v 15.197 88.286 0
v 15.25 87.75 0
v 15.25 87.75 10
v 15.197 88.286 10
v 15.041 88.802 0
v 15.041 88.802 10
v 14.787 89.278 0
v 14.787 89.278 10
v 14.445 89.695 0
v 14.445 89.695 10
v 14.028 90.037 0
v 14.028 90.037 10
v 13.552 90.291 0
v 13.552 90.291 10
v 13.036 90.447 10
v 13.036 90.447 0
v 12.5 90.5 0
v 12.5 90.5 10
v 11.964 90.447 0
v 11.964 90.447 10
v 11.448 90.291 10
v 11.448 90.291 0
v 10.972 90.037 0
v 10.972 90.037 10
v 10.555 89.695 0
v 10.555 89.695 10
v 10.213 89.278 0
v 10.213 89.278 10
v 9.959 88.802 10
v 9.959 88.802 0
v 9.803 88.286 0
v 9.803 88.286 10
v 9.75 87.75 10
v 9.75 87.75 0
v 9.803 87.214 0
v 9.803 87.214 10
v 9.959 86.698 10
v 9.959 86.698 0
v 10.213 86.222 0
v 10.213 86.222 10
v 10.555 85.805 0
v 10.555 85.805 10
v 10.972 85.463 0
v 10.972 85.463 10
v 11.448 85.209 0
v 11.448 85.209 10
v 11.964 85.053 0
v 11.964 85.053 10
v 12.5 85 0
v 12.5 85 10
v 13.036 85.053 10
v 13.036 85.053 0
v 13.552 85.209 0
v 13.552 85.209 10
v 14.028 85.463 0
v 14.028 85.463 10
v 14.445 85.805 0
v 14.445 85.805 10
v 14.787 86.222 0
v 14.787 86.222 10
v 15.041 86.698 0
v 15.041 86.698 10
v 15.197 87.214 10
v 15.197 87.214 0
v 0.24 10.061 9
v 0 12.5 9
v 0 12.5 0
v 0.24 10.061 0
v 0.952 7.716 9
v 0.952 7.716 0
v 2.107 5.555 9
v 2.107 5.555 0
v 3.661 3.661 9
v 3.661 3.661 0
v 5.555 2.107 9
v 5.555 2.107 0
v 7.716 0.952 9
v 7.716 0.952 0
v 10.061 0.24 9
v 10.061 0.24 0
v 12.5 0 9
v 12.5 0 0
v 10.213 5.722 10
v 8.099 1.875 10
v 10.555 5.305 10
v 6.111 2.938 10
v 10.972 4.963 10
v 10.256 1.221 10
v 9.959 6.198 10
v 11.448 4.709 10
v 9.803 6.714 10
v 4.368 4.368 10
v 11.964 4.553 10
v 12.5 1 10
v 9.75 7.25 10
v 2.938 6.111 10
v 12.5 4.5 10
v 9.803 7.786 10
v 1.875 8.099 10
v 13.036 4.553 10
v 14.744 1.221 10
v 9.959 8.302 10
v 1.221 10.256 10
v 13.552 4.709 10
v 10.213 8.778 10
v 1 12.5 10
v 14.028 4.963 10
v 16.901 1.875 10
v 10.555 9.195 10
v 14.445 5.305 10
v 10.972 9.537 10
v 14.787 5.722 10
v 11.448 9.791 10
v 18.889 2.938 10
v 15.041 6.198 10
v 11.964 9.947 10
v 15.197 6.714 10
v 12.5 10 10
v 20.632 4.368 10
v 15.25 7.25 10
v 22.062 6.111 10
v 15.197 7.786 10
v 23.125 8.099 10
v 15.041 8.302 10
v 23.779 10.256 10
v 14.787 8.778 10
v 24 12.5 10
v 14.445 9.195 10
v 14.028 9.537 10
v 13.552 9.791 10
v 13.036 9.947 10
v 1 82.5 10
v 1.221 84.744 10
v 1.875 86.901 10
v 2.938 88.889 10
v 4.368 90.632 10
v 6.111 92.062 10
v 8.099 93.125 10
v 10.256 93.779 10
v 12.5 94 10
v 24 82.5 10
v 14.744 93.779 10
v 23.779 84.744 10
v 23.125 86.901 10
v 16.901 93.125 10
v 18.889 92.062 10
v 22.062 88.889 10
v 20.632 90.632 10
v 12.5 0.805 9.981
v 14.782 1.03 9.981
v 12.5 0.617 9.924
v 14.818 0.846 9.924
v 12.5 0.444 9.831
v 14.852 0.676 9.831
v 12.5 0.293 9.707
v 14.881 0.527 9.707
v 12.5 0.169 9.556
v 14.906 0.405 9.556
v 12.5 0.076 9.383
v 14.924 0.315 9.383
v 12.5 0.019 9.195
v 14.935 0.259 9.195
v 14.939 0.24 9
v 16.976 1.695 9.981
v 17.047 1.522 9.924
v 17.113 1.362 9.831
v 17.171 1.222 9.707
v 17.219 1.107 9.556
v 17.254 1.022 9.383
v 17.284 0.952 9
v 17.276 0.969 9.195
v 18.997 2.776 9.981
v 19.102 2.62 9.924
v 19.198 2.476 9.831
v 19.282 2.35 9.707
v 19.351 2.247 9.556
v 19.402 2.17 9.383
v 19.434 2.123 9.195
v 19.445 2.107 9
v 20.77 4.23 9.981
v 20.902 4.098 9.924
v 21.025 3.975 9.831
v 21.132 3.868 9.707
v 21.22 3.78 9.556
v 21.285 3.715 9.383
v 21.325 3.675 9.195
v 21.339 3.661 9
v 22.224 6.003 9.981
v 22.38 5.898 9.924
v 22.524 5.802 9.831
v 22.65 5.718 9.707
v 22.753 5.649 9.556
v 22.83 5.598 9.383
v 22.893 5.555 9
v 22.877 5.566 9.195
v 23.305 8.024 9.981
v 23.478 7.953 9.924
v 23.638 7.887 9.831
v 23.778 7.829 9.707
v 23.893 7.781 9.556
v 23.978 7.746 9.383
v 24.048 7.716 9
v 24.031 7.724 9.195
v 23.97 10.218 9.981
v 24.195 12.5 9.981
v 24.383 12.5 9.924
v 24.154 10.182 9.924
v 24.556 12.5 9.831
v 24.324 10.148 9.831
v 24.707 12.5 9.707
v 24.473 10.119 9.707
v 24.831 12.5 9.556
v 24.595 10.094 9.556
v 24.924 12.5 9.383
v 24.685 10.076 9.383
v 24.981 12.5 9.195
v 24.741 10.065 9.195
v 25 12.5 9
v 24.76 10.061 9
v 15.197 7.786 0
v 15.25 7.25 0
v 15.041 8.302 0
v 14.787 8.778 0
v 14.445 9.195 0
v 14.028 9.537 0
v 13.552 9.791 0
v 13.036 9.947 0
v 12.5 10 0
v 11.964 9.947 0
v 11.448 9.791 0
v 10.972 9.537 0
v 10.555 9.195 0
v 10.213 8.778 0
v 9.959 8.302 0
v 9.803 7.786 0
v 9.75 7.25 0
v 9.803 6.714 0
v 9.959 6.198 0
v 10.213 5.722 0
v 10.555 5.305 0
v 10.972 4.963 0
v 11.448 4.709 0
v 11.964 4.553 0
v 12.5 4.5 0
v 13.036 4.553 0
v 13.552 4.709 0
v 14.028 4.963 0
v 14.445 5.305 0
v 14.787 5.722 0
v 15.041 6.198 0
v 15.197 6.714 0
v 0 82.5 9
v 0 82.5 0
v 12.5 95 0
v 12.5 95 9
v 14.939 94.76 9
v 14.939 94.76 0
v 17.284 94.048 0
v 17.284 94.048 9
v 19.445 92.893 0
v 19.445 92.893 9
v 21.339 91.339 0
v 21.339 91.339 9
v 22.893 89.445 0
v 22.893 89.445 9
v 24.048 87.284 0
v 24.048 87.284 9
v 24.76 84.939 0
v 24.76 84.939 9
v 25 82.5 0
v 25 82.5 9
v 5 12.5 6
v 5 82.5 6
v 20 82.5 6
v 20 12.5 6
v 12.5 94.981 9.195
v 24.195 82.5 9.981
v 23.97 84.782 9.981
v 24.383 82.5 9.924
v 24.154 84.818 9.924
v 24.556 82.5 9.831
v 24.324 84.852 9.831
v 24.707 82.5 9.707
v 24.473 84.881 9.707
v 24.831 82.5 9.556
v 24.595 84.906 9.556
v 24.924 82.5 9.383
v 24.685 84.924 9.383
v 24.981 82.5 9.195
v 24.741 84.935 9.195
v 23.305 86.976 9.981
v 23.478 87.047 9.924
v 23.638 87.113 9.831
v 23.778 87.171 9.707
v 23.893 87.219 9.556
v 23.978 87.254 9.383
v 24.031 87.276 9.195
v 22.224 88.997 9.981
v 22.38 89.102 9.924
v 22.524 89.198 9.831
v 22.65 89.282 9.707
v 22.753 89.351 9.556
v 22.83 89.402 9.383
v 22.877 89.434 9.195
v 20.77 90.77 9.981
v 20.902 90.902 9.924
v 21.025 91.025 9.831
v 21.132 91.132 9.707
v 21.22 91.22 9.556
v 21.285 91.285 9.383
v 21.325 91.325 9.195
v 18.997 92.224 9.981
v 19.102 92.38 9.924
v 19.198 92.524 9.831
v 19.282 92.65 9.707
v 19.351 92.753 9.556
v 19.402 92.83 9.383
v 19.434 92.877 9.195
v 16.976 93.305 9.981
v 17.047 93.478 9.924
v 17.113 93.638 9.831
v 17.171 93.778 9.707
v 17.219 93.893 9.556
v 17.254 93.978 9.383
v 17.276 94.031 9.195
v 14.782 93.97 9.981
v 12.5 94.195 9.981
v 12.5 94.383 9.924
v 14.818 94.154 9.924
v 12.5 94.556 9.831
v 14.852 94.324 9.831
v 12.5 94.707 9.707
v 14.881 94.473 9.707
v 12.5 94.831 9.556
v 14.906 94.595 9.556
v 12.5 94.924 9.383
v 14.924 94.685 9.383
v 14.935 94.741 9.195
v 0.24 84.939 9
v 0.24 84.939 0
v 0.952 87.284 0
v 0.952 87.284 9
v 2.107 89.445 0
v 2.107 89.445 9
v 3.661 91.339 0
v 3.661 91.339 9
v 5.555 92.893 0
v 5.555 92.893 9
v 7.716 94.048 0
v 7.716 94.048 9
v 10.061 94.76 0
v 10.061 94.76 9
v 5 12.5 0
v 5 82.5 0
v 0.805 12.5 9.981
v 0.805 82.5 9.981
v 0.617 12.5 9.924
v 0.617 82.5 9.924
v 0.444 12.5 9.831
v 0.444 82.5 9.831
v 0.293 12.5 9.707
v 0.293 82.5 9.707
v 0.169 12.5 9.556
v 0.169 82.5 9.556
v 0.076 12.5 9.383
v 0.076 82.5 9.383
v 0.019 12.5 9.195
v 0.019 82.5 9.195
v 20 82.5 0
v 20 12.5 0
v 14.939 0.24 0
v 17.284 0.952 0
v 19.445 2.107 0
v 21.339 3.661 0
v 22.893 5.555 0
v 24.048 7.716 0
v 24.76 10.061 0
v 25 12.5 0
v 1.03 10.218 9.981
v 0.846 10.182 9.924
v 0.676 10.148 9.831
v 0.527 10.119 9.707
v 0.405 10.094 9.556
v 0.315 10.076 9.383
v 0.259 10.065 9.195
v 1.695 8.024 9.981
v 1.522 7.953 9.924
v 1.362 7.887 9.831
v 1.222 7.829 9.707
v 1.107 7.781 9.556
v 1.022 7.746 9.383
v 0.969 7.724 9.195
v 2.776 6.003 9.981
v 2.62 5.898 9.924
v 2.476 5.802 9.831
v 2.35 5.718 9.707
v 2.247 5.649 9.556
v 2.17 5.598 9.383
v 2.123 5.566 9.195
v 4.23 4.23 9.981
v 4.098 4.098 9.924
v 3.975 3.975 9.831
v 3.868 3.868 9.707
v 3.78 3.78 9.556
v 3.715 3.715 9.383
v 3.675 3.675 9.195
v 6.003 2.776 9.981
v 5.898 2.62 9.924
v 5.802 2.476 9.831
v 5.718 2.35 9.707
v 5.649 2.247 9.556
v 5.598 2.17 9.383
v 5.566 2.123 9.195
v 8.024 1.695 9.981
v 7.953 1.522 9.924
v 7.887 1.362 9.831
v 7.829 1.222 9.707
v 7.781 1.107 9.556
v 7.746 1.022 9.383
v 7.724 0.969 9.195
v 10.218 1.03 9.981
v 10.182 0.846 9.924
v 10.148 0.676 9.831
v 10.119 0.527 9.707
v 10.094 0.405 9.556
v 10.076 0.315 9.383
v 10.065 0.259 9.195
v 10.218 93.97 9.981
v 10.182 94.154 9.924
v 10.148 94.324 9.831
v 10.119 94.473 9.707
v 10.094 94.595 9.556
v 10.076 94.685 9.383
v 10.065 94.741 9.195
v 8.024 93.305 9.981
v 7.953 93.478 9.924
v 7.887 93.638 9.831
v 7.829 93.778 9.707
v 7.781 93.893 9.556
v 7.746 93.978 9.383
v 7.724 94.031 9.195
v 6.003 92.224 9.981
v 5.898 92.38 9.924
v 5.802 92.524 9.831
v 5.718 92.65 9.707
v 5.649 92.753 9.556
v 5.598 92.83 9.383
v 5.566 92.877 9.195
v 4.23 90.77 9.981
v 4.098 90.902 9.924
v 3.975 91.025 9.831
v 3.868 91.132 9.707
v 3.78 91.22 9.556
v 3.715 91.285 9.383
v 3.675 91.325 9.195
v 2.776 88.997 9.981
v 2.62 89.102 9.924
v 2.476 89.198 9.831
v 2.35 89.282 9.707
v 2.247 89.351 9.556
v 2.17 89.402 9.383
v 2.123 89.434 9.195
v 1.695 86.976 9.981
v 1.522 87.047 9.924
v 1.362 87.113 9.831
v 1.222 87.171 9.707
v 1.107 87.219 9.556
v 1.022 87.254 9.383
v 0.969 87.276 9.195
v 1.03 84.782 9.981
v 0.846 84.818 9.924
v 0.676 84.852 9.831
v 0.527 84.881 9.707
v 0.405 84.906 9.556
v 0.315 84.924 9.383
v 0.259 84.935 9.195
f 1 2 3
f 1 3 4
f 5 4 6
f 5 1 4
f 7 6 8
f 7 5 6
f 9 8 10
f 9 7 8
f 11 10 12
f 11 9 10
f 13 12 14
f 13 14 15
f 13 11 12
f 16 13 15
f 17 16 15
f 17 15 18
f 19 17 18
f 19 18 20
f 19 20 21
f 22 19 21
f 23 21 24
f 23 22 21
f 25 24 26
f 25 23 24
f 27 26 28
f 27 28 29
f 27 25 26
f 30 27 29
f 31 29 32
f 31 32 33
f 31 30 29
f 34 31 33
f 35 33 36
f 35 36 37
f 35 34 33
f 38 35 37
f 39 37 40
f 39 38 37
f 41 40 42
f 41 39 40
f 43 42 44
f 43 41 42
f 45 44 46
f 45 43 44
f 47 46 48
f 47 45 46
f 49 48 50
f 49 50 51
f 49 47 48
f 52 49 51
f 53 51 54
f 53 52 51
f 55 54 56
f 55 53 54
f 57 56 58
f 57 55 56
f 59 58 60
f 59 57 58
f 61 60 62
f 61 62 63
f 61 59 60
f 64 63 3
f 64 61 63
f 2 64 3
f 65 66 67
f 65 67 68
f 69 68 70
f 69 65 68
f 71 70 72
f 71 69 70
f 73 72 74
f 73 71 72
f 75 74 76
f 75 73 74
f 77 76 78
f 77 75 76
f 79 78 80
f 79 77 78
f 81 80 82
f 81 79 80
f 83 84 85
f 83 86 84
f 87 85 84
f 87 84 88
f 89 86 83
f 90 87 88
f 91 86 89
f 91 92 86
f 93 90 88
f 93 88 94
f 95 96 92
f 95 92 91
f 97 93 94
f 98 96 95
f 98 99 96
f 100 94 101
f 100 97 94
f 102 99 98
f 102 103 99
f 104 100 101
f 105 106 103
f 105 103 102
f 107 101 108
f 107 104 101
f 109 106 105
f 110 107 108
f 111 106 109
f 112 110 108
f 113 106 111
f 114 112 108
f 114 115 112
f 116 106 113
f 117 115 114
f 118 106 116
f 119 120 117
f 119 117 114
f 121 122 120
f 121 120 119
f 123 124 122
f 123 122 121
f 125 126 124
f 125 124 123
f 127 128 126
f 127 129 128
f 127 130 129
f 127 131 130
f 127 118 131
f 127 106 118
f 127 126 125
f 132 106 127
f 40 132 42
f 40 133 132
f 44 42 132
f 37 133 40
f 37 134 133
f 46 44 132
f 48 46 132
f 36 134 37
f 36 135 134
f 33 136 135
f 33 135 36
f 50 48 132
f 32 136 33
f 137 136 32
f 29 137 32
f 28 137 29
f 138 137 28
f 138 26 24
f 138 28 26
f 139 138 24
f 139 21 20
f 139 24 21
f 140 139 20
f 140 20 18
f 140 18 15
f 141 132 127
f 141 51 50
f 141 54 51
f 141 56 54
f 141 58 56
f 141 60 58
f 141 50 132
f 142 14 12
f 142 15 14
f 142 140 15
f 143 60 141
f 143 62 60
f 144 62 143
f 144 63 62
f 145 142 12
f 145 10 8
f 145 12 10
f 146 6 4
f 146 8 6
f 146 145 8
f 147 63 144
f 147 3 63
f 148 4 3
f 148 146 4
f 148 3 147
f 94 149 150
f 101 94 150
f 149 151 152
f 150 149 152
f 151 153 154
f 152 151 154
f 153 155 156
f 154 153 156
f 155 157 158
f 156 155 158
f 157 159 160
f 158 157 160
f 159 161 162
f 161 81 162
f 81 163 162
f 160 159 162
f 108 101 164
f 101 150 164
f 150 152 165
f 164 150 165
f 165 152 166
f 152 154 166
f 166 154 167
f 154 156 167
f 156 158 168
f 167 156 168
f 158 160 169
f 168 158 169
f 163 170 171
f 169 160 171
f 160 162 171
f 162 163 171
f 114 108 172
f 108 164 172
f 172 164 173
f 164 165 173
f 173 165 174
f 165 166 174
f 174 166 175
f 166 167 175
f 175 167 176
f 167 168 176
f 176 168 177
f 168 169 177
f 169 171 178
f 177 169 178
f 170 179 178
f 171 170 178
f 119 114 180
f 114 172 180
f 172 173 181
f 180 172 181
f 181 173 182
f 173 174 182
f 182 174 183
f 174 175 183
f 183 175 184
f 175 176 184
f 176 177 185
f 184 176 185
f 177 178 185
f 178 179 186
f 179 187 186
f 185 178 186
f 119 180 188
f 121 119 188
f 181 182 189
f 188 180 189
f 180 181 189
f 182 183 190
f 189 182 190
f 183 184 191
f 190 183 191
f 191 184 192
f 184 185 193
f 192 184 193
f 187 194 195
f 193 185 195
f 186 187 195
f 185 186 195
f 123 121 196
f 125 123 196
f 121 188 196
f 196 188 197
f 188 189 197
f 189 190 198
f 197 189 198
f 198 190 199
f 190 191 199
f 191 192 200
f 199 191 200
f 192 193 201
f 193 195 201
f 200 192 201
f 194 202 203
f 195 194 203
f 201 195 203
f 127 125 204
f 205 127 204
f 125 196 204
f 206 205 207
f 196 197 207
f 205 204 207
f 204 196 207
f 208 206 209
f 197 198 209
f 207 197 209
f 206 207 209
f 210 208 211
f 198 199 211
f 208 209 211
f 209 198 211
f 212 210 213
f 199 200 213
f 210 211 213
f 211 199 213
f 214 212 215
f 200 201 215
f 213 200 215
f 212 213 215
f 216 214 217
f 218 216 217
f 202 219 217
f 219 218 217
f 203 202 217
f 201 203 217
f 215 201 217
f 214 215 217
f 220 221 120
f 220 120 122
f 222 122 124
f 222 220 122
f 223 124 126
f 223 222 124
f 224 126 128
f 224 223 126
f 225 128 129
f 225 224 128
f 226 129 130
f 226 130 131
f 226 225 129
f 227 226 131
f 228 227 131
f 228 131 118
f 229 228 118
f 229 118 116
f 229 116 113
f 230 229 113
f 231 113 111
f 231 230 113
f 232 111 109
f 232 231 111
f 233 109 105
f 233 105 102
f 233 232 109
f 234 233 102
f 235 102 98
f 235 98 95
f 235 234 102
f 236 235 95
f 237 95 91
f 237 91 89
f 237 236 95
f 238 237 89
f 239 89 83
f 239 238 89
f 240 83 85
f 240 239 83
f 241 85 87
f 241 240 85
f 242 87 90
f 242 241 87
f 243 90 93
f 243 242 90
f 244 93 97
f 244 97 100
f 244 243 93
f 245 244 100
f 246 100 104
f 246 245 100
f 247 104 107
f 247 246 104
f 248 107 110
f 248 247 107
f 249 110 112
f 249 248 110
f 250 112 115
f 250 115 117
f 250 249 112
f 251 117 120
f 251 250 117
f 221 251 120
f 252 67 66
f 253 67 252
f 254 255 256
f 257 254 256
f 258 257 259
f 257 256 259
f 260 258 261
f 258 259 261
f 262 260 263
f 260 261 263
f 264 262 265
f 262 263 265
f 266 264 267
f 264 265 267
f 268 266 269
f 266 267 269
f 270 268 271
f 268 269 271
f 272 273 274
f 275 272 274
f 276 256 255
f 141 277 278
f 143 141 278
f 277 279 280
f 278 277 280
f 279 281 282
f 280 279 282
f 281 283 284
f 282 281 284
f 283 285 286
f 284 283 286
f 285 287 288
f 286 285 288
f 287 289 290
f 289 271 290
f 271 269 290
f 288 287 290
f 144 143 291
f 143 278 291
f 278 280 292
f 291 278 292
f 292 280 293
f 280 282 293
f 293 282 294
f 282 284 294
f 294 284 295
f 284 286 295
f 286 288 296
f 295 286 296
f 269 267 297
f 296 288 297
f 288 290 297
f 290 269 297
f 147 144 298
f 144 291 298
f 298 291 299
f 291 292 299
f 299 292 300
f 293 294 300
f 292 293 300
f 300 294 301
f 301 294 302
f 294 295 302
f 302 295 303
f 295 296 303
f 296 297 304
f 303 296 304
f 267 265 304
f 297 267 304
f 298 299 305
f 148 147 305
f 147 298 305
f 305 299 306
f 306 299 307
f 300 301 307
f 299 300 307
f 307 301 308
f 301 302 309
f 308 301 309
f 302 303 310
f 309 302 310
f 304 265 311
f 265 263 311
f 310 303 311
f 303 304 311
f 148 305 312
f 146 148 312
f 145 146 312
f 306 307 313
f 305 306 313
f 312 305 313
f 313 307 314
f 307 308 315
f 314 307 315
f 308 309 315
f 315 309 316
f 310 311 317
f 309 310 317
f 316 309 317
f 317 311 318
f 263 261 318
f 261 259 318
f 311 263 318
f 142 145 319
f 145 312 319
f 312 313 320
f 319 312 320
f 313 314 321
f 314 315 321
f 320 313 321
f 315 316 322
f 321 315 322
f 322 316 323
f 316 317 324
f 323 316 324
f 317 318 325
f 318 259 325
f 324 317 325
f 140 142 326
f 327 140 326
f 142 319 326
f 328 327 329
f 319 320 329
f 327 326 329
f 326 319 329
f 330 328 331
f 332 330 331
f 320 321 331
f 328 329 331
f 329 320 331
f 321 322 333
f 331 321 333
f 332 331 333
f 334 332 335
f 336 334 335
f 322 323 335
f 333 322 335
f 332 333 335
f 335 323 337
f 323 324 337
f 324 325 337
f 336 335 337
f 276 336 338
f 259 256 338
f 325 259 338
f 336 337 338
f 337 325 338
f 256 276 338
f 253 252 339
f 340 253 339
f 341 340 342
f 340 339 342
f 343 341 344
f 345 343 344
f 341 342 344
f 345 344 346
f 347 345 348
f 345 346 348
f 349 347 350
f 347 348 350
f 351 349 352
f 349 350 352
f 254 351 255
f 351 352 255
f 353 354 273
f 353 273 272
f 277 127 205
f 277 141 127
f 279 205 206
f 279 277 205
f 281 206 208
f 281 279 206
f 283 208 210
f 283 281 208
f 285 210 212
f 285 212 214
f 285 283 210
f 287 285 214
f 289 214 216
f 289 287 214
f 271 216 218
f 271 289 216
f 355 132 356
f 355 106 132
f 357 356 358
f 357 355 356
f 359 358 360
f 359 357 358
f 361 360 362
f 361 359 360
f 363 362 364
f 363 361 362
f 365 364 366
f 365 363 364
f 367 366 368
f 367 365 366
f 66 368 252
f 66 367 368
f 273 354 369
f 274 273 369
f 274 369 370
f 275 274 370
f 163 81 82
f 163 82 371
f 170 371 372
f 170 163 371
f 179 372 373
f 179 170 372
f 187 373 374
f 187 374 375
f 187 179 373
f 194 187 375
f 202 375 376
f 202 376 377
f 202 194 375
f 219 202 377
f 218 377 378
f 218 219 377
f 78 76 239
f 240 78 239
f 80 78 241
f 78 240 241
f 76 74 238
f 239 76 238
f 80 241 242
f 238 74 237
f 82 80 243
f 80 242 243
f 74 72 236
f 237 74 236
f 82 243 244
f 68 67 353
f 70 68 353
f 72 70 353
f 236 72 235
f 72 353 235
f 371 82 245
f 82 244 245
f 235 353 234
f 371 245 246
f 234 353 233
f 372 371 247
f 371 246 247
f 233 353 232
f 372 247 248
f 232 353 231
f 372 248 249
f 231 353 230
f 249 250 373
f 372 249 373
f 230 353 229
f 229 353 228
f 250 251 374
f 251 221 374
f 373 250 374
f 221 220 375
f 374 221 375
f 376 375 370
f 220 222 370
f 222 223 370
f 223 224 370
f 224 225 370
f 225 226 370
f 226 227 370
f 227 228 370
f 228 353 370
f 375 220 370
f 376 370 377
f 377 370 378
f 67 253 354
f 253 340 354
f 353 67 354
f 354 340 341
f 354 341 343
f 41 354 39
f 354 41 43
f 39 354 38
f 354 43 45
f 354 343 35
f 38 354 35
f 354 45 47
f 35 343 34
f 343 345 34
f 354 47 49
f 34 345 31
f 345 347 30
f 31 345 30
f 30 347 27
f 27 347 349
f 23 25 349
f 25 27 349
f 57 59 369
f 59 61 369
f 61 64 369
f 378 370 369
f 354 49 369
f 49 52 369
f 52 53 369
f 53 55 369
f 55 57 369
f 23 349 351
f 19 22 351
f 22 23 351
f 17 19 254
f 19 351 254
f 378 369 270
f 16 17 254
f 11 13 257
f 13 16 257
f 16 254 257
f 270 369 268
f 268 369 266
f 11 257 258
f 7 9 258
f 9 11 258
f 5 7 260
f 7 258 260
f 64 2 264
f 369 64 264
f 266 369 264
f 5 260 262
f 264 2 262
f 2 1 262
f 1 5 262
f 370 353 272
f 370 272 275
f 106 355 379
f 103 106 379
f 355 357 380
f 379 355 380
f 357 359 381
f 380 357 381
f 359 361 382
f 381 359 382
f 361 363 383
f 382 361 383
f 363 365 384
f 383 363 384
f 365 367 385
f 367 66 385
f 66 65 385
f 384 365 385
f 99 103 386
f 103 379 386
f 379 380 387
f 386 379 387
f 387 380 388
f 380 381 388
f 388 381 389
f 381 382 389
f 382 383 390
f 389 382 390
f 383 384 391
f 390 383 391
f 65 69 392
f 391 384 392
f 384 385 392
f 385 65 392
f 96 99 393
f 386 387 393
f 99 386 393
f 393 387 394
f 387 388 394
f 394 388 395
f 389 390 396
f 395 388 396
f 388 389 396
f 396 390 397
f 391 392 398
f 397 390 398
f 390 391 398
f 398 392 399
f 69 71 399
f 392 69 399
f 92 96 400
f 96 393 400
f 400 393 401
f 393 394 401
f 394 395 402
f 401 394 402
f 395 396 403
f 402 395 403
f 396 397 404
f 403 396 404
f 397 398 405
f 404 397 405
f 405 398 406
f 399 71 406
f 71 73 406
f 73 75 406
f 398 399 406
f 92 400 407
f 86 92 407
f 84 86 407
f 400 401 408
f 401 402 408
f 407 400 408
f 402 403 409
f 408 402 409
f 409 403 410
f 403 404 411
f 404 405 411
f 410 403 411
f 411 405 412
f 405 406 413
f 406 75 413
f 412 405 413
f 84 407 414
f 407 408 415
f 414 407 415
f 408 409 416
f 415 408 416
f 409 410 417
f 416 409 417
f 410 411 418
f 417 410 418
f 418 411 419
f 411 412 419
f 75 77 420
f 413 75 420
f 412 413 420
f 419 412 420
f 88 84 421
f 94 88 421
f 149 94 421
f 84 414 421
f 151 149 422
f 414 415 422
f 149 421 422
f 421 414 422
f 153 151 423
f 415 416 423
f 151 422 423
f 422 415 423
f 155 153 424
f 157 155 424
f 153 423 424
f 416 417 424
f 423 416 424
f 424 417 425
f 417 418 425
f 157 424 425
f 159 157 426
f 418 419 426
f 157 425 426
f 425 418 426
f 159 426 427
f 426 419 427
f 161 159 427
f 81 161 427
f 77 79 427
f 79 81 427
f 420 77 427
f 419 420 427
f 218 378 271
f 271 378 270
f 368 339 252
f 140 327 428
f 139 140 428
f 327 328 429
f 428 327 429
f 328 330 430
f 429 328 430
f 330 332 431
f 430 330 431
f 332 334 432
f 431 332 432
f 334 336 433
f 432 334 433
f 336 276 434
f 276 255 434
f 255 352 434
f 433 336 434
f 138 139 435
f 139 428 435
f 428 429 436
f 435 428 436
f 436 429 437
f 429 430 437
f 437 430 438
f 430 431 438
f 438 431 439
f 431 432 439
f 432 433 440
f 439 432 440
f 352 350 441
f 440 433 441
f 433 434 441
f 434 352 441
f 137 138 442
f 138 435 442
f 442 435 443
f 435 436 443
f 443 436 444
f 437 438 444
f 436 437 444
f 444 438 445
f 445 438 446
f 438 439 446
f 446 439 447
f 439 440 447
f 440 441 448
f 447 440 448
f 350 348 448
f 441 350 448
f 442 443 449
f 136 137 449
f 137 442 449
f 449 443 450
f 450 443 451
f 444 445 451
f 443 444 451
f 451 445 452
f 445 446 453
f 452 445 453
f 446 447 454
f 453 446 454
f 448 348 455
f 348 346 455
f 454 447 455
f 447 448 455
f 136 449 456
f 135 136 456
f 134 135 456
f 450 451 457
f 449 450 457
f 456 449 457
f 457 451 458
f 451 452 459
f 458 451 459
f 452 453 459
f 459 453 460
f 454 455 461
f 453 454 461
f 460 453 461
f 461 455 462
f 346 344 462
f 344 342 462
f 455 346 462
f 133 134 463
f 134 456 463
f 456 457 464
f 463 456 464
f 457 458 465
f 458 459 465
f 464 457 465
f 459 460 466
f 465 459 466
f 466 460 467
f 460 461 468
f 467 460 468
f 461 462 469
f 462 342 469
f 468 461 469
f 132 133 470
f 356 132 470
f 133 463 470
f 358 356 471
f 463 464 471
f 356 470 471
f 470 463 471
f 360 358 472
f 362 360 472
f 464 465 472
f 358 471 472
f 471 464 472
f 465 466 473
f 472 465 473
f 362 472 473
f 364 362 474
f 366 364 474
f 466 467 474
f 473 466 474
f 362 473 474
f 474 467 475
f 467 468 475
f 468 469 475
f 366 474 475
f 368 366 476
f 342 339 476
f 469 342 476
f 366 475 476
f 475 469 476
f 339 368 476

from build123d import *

# Parameters (mm, degrees)
F0_W     = 25
F0_H     = 95
F0_R     = 2.75
F1_DEPTH = 10
F2_R     = 12.49999
F3_R     = 1
F4_W     = 15
F4_H     = 70
F5_DEPTH = 6


# Not quite as in the source:
# - a fillet or chamfer is up to 0.001 mm smaller than in the source, because OpenCascade refuses the exact size


with BuildPart() as f1:
    # F0 (on Top) → F1 (new body)
    with BuildSketch(Plane.XY):
        with Locations((12.5, 47.5)):
            Rectangle(F0_W, F0_H)
        with Locations((12.5, 7.25)):
            Circle(F0_R, mode=Mode.SUBTRACT)
        with Locations((12.5, 87.75)):
            Circle(F0_R, mode=Mode.SUBTRACT)
    extrude(amount=F1_DEPTH)

    # F2 (radius 12.5 in the source; OpenCascade refuses exactly that, so slightly less here)
    f2_edges = [f1.edges().sort_by_distance(p)[0] for p in [
        (25, 95, 5),
        (0, 95, 5),
        (25, 0, 5),
        (0, 0, 5),
    ]]
    fillet(f2_edges, radius=F2_R)

    # F3
    f3_edges = [f1.edges().sort_by_distance(p)[0] for p in [
        (25, 47.5, 10),
        (0, 47.5, 10),
        (12.5, 95, 10),
        (21.338838, 91.338838, 10),
        (3.661162, 91.338838, 10),
        (21.338838, 3.661162, 10),
        (12.5, 0, 10),
        (3.661162, 3.661162, 10),
    ]]
    fillet(f3_edges, radius=F3_R)

    # F4 (on face) → F5 (cut)
    with BuildSketch(Plane(origin=(0, 0, 0), x_dir=(1, 0, 0), z_dir=(0, 0, -1))):
        with Locations((12.5, -47.5)):
            Rectangle(F4_W, F4_H)
    extrude(amount=-F5_DEPTH, mode=Mode.SUBTRACT)


solid = f1.part
